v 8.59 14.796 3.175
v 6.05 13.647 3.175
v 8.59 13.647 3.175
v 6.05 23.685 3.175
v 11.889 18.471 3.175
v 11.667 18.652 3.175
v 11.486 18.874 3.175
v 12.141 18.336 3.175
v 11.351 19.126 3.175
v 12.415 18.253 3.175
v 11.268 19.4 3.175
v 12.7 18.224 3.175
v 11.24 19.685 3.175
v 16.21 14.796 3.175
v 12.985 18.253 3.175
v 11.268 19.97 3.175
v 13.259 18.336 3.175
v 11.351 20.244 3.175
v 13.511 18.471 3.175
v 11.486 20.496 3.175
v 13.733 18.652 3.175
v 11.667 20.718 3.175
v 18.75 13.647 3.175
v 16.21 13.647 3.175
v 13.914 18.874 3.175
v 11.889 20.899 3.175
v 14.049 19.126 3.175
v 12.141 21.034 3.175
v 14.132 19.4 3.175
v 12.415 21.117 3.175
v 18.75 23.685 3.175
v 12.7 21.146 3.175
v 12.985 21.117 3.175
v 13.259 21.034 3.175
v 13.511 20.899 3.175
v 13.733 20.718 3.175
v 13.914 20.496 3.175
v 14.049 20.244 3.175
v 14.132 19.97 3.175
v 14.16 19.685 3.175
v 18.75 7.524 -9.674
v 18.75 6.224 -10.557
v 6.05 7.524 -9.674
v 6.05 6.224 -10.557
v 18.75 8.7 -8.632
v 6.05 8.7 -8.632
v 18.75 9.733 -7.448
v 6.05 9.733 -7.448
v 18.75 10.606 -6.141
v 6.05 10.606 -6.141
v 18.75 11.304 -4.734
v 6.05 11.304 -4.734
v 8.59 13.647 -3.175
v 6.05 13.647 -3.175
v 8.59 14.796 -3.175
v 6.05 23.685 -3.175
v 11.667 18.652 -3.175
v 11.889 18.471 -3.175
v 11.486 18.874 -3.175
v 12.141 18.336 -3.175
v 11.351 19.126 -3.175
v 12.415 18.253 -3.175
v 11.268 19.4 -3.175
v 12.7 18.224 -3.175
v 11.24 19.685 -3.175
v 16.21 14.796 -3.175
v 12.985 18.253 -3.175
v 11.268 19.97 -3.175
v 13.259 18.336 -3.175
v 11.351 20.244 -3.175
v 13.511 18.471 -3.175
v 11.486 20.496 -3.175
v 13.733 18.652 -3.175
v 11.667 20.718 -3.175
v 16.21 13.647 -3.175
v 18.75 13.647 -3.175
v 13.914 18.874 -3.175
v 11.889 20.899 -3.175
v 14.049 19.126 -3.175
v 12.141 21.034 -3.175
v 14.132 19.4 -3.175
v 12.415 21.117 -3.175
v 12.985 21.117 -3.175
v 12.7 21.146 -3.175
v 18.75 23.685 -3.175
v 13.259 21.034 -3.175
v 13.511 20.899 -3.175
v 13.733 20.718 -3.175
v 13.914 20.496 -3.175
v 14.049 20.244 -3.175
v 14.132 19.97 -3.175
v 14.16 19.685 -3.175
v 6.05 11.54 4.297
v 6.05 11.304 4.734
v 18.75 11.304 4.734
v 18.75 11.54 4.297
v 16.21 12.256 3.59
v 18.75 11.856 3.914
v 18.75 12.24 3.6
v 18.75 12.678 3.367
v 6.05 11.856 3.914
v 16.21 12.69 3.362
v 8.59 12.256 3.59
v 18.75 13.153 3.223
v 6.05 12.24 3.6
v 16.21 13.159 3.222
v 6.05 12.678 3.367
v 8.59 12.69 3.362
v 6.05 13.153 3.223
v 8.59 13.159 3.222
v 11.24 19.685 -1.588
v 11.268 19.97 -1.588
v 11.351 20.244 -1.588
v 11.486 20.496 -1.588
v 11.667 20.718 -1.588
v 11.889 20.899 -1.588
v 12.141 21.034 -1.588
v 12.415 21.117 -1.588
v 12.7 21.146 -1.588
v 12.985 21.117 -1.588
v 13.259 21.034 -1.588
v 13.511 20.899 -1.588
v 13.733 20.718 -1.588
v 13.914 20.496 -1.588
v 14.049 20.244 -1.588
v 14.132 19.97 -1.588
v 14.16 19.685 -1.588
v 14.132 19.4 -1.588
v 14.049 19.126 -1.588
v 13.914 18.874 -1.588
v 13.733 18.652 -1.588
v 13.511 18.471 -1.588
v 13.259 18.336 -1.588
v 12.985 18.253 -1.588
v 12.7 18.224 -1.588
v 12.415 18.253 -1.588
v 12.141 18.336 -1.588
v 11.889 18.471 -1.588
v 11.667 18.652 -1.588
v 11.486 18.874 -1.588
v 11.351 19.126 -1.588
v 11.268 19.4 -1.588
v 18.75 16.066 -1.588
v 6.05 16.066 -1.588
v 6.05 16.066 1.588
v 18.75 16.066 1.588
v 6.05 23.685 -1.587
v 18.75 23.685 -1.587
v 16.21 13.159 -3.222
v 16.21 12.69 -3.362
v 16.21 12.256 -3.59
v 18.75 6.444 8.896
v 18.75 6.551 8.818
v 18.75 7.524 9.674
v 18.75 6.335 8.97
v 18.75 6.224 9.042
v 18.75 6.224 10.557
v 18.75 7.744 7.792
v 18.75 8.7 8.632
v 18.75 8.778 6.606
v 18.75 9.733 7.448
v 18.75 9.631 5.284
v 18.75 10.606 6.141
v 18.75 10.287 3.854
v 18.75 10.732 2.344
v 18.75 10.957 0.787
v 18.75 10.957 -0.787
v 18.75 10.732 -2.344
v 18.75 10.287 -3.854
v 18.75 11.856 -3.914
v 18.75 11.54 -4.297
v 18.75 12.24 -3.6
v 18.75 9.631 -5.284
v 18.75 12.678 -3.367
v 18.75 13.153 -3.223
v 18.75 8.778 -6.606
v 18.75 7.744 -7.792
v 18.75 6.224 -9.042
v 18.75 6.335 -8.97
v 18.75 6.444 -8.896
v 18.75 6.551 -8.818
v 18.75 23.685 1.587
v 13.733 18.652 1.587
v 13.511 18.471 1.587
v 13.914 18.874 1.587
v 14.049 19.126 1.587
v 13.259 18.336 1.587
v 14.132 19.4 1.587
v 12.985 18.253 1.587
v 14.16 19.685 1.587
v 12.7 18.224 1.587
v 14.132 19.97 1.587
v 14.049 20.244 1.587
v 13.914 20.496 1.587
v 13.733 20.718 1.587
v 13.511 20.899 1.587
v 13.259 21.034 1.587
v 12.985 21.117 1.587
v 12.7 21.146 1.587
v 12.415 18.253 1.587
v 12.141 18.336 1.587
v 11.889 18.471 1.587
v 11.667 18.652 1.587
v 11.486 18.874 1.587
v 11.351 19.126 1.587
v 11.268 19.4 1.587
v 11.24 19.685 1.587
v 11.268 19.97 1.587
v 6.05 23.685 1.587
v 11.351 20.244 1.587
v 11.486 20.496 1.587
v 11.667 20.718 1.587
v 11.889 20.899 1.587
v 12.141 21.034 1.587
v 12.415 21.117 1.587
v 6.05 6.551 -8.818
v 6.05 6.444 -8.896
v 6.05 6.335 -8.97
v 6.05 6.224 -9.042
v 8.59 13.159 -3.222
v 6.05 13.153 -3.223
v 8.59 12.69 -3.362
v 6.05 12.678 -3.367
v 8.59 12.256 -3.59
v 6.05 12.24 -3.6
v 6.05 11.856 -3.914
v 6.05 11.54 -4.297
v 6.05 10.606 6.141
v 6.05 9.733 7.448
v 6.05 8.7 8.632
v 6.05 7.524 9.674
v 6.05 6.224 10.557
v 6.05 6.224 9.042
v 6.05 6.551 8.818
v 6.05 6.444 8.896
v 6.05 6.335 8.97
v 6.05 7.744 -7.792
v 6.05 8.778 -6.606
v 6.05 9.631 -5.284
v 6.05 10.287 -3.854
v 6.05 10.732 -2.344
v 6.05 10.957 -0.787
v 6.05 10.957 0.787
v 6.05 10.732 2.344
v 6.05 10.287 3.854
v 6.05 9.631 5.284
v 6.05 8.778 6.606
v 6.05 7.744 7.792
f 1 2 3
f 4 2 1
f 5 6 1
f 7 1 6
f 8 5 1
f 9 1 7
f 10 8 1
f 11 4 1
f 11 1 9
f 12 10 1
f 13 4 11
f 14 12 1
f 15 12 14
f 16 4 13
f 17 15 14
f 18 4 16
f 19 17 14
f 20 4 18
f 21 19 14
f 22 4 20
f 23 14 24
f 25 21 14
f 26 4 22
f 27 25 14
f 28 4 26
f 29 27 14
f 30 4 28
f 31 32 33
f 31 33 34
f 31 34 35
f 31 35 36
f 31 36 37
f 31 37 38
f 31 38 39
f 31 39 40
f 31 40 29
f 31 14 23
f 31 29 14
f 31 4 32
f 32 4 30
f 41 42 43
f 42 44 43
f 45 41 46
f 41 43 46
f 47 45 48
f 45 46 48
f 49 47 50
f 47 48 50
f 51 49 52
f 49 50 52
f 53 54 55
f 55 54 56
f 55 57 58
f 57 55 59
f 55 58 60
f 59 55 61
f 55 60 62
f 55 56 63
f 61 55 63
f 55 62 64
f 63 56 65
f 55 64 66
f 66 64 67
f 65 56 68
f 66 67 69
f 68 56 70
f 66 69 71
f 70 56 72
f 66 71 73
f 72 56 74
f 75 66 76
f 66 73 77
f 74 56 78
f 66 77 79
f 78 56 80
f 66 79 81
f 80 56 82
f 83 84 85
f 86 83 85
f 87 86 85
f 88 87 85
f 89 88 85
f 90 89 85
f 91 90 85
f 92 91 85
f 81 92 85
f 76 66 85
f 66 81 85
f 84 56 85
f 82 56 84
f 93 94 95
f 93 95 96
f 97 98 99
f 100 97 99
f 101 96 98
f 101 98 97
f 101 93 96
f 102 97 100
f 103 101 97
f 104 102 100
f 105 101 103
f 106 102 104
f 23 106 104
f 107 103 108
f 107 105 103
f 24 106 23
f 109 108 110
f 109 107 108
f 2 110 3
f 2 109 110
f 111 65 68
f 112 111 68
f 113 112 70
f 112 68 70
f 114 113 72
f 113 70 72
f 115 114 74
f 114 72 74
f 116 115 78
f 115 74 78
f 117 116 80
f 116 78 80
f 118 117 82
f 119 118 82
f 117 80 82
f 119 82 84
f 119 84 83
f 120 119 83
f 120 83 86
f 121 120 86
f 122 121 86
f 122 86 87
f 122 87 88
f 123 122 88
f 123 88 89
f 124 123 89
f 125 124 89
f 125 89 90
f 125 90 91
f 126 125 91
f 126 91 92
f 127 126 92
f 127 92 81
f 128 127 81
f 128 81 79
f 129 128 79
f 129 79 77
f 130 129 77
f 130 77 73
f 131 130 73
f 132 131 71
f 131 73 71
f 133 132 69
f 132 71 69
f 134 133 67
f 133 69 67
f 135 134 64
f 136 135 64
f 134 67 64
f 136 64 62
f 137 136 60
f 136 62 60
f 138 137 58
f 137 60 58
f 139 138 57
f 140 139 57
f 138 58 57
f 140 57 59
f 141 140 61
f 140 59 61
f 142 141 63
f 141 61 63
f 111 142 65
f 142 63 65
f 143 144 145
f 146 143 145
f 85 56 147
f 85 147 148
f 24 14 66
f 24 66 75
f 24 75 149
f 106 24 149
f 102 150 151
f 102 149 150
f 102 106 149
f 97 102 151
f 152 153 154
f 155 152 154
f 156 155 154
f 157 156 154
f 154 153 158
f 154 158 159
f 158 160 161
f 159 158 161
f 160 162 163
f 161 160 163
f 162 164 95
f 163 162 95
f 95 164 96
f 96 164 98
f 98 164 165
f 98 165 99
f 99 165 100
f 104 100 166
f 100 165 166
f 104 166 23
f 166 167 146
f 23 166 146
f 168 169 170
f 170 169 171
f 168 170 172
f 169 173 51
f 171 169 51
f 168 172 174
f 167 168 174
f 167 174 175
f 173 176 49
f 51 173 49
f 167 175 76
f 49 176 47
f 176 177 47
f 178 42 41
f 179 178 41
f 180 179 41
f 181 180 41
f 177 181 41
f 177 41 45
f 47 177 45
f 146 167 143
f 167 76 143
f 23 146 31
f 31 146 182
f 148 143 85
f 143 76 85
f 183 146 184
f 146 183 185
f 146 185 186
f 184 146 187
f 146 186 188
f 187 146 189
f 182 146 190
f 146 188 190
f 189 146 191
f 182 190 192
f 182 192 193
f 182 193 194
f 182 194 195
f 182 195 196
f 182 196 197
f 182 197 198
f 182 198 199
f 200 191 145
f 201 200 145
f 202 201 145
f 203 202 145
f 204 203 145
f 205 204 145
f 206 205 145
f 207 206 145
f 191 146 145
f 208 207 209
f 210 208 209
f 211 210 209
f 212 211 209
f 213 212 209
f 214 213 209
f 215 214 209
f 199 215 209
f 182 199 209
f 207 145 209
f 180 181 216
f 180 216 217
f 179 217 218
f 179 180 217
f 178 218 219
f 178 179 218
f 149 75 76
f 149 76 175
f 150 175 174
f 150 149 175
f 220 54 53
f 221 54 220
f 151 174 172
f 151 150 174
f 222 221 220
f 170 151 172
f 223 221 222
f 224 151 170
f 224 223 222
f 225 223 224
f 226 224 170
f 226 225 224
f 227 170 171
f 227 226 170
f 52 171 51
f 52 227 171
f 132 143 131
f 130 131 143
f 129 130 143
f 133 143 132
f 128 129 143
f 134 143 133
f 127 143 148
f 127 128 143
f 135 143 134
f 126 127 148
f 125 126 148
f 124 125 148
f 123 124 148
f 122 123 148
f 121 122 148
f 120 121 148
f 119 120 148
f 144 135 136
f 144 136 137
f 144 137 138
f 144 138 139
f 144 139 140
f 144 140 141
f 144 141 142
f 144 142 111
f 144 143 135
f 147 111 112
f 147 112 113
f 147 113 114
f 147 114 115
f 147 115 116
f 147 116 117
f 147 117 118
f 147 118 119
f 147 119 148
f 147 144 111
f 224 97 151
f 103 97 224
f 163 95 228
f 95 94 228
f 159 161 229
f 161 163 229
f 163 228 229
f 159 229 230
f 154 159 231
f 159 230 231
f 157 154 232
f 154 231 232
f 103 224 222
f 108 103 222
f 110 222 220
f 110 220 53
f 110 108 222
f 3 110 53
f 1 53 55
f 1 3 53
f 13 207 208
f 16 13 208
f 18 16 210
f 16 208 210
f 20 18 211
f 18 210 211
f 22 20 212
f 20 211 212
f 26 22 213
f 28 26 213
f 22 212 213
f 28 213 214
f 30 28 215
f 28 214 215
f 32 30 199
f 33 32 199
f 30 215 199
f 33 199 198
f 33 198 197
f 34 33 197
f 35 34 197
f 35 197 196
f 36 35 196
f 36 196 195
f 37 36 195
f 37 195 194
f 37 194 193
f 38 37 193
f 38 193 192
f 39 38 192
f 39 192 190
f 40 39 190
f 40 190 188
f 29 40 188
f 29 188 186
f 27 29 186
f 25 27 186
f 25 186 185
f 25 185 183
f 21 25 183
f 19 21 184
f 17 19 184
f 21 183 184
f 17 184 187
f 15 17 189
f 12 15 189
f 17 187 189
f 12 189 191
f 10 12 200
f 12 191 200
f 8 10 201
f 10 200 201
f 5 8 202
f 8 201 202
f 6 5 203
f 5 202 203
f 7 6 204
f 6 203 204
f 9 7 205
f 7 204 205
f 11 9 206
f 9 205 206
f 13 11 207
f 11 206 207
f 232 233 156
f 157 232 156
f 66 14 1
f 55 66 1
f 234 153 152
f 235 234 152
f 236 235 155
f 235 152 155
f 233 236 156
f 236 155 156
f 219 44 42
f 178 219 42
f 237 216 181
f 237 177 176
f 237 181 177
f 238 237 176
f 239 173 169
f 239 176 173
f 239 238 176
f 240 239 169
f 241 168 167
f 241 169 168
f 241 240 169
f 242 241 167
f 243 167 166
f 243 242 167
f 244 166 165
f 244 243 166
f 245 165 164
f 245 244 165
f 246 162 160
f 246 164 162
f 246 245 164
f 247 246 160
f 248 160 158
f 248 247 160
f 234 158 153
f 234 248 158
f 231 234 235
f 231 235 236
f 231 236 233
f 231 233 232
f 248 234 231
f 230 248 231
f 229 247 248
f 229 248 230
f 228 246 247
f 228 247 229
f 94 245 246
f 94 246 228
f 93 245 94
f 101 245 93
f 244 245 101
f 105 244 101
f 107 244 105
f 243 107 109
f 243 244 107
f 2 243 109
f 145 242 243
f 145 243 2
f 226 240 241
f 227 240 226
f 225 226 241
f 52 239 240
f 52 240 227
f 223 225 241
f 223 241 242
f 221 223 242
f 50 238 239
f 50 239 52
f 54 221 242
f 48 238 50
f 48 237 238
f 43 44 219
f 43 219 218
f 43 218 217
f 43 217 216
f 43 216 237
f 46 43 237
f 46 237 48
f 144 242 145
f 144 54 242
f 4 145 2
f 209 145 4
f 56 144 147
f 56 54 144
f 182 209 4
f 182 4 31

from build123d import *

# Parameters (mm, degrees)
SKETCH1_R                            = 12.2555
SKETCH1_R_2                          = 10.9855
BOSS_EXTRUDE1_DEPTH                  = 25.4
CUT_EXTRUDE1_DEPTH                   = 31.749870902
CUT_EXTRUDE1_DEPTH_BACK              = 31.749870902
SKETCH2_W                            = 7.874
SKETCH2_H                            = 0.935
SKETCH8_W                            = 25.4
SKETCH8_H                            = 6.35
BOSS_EXTRUDE2_DEPTH                  = 11.43
BOSS_EXTRUDE2_DIRECTION_2_REACH      = 39.365
BOSS_EXTRUDE2_DIRECTION_2_END_RADIUS = 12.2555
SKETCH9_R                            = 1.4605
CUT_EXTRUDE6_DEPTH                   = 39.003463533
SKETCH10_W                           = 3.175
SKETCH10_H                           = 7.62
CUT_EXTRUDE7_DEPTH                   = 25.4
FILLET2_R                            = 2.54
SKETCH11_R                           = 10.9855
CUT_EXTRUDE8_DEPTH                   = 37.82879567
SKETCH12_R                           = 1.2875
BOSS_EXTRUDE3_DEPTH                  = 2.196999908
BOSS_EXTRUDE4_START                  = -25.4
BOSS_EXTRUDE4_DEPTH                  = 25.4
FILLET3_R                            = 5.08
FILLET3_OF_MIRROR2_R                 = 5.08
CUT_EXTRUDE9_DEPTH                   = 43.697648058
CUT_EXTRUDE9_DEPTH_BACK              = 43.697648058
SKETCH13_W                           = 17.526
SKETCH13_H                           = 2.120056883
SKETCH13_W_2                         = 0.599999908
SKETCH13_H_2                         = 18.990443025
FILLET4_R                            = 5.08
CUT_EXTRUDE10_DEPTH                  = 37.861439453
CUT_EXTRUDE10_DEPTH_BACK             = 37.861439453
SKETCH17_W                           = 24.800000092
SKETCH17_H                           = 8.799318797
CUT_EXTRUDE11_DEPTH                  = 2.54
CUT_EXTRUDE11_DEPTH_BACK             = 37.940724096
SKETCH18_W                           = 7.62
SKETCH18_H                           = 1.148317315
SKETCH18_H_2                         = 1.391682685
CUT_EXTRUDE12_DEPTH                  = 36.881723087
CUT_EXTRUDE12_DEPTH_BACK             = 36.881723087
SKETCH19_W                           = 6.050000046
SKETCH19_H                           = 17.461181295


with BuildPart() as part:
    # Sketch1 → Boss-Extrude1 (new body)
    with BuildSketch(Plane(origin=(0, 0, 0), x_dir=(0, 0, -1), z_dir=(1, 0, 0))):
        Circle(SKETCH1_R)
        Circle(SKETCH1_R_2, mode=Mode.SUBTRACT)
    extrude(amount=BOSS_EXTRUDE1_DEPTH)

    # Sketch2 → Cut-Extrude1 (cut, two sides: drawn at the far end of the back side and taken through both)
    with BuildSketch(Plane(origin=(0, 0, 0), x_dir=(1, 0, 0), z_dir=(0, 1, 0)).offset(-CUT_EXTRUDE1_DEPTH_BACK)):
        with Locations((21.463, 11.788)):
            Rectangle(SKETCH2_W, SKETCH2_H)
        with Locations((21.463, -11.788)):
            Rectangle(SKETCH2_W, SKETCH2_H)
    extrude(amount=CUT_EXTRUDE1_DEPTH + CUT_EXTRUDE1_DEPTH_BACK, mode=Mode.SUBTRACT)

    # Sketch8 → Boss-Extrude2 (add)
    with BuildSketch(Plane(origin=(0, 12.2555, 0), x_dir=(1, 0, 0), z_dir=(0, 1, 0))):
        with Locations((12.7, 0)):
            Rectangle(SKETCH8_W, SKETCH8_H)
    extrude(amount=BOSS_EXTRUDE2_DEPTH)

    # Boss-Extrude2 direction 2: up to this cylinder (the profile starts outside it)
    boss_extrude2_direction_2_end = Plane(origin=(12.7, 0, 0), z_dir=(-1, 0, 0)) * Cylinder(BOSS_EXTRUDE2_DIRECTION_2_END_RADIUS, 104.241, mode=Mode.PRIVATE)
    # Sketch8 → Boss-Extrude2 direction 2 (add, up to the surface)
    with BuildSketch(Plane(origin=(0, 12.2555, 0), x_dir=(1, 0, 0), z_dir=(0, 1, 0)), mode=Mode.PRIVATE) as boss_extrude2_direction_2_sk1:
        with Locations((12.7, 0)):
            Rectangle(SKETCH8_W, SKETCH8_H)
    boss_extrude2_direction_2_tool1 = extrude(boss_extrude2_direction_2_sk1.sketch, amount=-BOSS_EXTRUDE2_DIRECTION_2_REACH, mode=Mode.PRIVATE) - boss_extrude2_direction_2_end
    add(boss_extrude2_direction_2_tool1.solids().sort_by_distance((12.7, 12.2555, 0))[0])
    add(boss_extrude2_direction_2_tool1.solids().sort_by_distance((12.7, 12.2555, 0))[1])

    # Sketch9 → Cut-Extrude6 (cut, through all)
    with BuildSketch(Plane(origin=(0, 0, -3.175), x_dir=(-1, 0, 0), z_dir=(0, 0, -1))):
        with Locations((-12.7, 19.685)):
            Circle(SKETCH9_R)
    extrude(amount=-CUT_EXTRUDE6_DEPTH, mode=Mode.SUBTRACT)

    # Sketch10 → Cut-Extrude7 (cut)
    with BuildSketch(Plane.ZY):
        with Locations((0, 19.8755)):
            Rectangle(SKETCH10_W, SKETCH10_H)
    extrude(amount=-CUT_EXTRUDE7_DEPTH, mode=Mode.SUBTRACT)

    # Fillet2
    fillet2_edges = [part.edges().sort_by_distance(p)[0] for p in [
        (12.7, 11.837088124, 3.175),
        (12.7, 11.837088124, -3.175),
    ]]
    fillet(fillet2_edges, radius=FILLET2_R)

    # Sketch11 → Cut-Extrude8 (cut, through all)
    with BuildSketch(Plane(origin=(25.4, 0, 0), x_dir=(0, 0, -1), z_dir=(1, 0, 0))):
        with BuildLine():
            ThreePointArc((-10.9855, 0), (-10.718799827, -2.405938595), (-9.931648919, -4.695056975))
            Line((-9.931648919, -4.695056975), (9.931648919, -4.695056975))
            ThreePointArc((9.931648919, -4.695056975), (10.718799827, -2.405938595), (10.9855, 0))
            Line((10.9855, 0), (-10.9855, 0))
        make_face()
        with BuildLine():
            Line((9.931648919, -4.695056975), (-9.931648919, -4.695056975))
            ThreePointArc((-9.931648919, -4.695056975), (0, -10.9855), (9.931648919, -4.695056975))
        make_face()
        Circle(SKETCH11_R)
        with BuildLine():
            Line((-11.3205, -4.695056975), (11.3205, -4.695056975))
            ThreePointArc((11.3205, -4.695056975), (0, -12.2555), (-11.3205, -4.695056975))
        make_face()
        with BuildLine():
            Line((-11.3205, -4.695056975), (-11.3205, -12.703036631))
            Line((-11.3205, -12.703036631), (11.3205, -12.703036631))
            Line((11.3205, -12.703036631), (11.3205, -4.695056975))
            ThreePointArc((11.3205, -4.695056975), (0, -12.2555), (-11.3205, -4.695056975))
        make_face()
        with BuildLine():
            Line((-10.9855, 0), (-10.9855, -4.695056975))
            Line((-10.9855, -4.695056975), (-9.931648919, -4.695056975))
            ThreePointArc((-9.931648919, -4.695056975), (-10.718799827, -2.405938595), (-10.9855, 0))
        make_face()
        with BuildLine():
            Line((9.931648919, -4.695056975), (10.9855, -4.695056975))
            Line((10.9855, -4.695056975), (10.9855, 0))
            ThreePointArc((10.9855, 0), (10.718799827, -2.405938595), (9.931648919, -4.695056975))
        make_face()
    extrude(amount=-CUT_EXTRUDE8_DEPTH, mode=Mode.SUBTRACT)

    # Sketch12 → Boss-Extrude3 (add)
    with BuildSketch(Plane(origin=(0, 0, -11.3205), x_dir=(-1, 0, 0), z_dir=(0, 0, -1))):
        with Locations(Location((-22.225, 0, 0), (0, 0, 180))):
            Circle(SKETCH12_R)
    boss_extrude3 = extrude(amount=BOSS_EXTRUDE3_DEPTH)

    # Mirror1: Boss-Extrude3 across plane
    add(boss_extrude3.mirror(Plane.XY))

    # Sketch14 → Boss-Extrude4 (add)
    with BuildSketch(Plane(origin=(25.4, 0, 0), x_dir=(0, 0, -1), z_dir=(1, 0, 0)).offset(BOSS_EXTRUDE4_START)):
        with BuildLine():
            ThreePointArc((-9.8205, 4.923310878), (-10.690283275, 2.529635102), (-10.9855, 0))
            Line((-10.9855, 0), (-10.9855, -4.695056975))
            Line((-10.9855, -4.695056975), (-9.8205, -4.695056975))
            Line((-9.8205, -4.695056975), (-9.8205, 4.923310878))
        make_face()
    boss_extrude4 = extrude(amount=BOSS_EXTRUDE4_DEPTH)

    # Fillet3
    fillet3_edges = [part.edges().sort_by_distance(p)[0] for p in [
        (12.7, 4.923310878, 9.8205),
    ]]
    fillet(fillet3_edges, radius=FILLET3_R)

    # Mirror2: Boss-Extrude4 across plane
    add(boss_extrude4.mirror(Plane.XY))

    # Fillet3 of Mirror2
    fillet3_of_mirror2_edges = [part.edges().sort_by_distance(p)[0] for p in [
        (12.7, 4.923310878, -9.8205),
    ]]
    fillet(fillet3_of_mirror2_edges, radius=FILLET3_OF_MIRROR2_R)

    # Sketch13 → Cut-Extrude9 (cut, two sides: drawn at the far end of the back side and taken through both)
    with BuildSketch(Plane(origin=(0, 0, -11.3205), x_dir=(-1, 0, 0), z_dir=(0, 0, -1)).offset(-CUT_EXTRUDE9_DEPTH_BACK)):
        with BuildLine():
            ThreePointArc((-22.225, -2.575000092), (-24.045800027, -1.820800027), (-24.800000092, 0))
            Line((-24.800000092, 0), (-24.800000092, 4.695056975))
            Line((-24.800000092, 4.695056975), (-25.4, 4.695056975))
            Line((-25.4, 4.695056975), (-25.4, -4.695056975))
            Line((-25.4, -4.695056975), (-17.526, -4.695056975))
            Line((-17.526, -4.695056975), (-17.526, -2.575000092))
            Line((-17.526, -2.575000092), (-22.225, -2.575000092))
        make_face()
        with Locations((-8.763, -3.635028533)):
            Rectangle(SKETCH13_W, SKETCH13_H)
        with Locations((-25.100000046, 14.190278488)):
            Rectangle(SKETCH13_W_2, SKETCH13_H_2)
    extrude(amount=CUT_EXTRUDE9_DEPTH + CUT_EXTRUDE9_DEPTH_BACK, mode=Mode.SUBTRACT)

    # Fillet4
    fillet4_edges = [part.edges().sort_by_distance(p)[0] for p in [
        (24.800000092, 23.6855, -2.38125),
        (24.800000092, 23.6855, 2.38125),
        (0, 23.6855, -2.38125),
        (0, 23.6855, 2.38125),
    ]]
    fillet(fillet4_edges, radius=FILLET4_R)

    # Sketch17 → Cut-Extrude10 (cut, two sides: drawn at the far end of the back side and taken through both)
    with BuildSketch(Plane.XY.offset(-CUT_EXTRUDE10_DEPTH_BACK)):
        with Locations((12.400000046, 1.824659306)):
            Rectangle(SKETCH17_W, SKETCH17_H)
    extrude(amount=CUT_EXTRUDE10_DEPTH + CUT_EXTRUDE10_DEPTH_BACK, mode=Mode.SUBTRACT)

    # Sketch18 → Cut-Extrude11 (cut, two sides: drawn at the far end of the back side and taken through both)
    with BuildSketch(Plane(origin=(0, 0, -3.175), x_dir=(-1, 0, 0), z_dir=(0, 0, -1)).offset(-CUT_EXTRUDE11_DEPTH_BACK)):
        with Locations((-12.400000046, 14.221341343)):
            Rectangle(SKETCH18_W, SKETCH18_H)
        with Locations((-12.400000046, 12.951341343)):
            Rectangle(SKETCH18_W, SKETCH18_H_2)
    extrude(amount=CUT_EXTRUDE11_DEPTH + CUT_EXTRUDE11_DEPTH_BACK, mode=Mode.SUBTRACT)

    # Sketch19 → Cut-Extrude12 (cut, two sides: drawn at the far end of the back side and taken through both)
    with BuildSketch(Plane.XY.offset(-CUT_EXTRUDE12_DEPTH_BACK)):
        with Locations((3.025000023, 14.954909352)):
            Rectangle(SKETCH19_W, SKETCH19_H)
        with Locations((21.775000069, 14.954909352)):
            Rectangle(SKETCH19_W, SKETCH19_H)
    extrude(amount=CUT_EXTRUDE12_DEPTH + CUT_EXTRUDE12_DEPTH_BACK, mode=Mode.SUBTRACT)


solid = part.part
